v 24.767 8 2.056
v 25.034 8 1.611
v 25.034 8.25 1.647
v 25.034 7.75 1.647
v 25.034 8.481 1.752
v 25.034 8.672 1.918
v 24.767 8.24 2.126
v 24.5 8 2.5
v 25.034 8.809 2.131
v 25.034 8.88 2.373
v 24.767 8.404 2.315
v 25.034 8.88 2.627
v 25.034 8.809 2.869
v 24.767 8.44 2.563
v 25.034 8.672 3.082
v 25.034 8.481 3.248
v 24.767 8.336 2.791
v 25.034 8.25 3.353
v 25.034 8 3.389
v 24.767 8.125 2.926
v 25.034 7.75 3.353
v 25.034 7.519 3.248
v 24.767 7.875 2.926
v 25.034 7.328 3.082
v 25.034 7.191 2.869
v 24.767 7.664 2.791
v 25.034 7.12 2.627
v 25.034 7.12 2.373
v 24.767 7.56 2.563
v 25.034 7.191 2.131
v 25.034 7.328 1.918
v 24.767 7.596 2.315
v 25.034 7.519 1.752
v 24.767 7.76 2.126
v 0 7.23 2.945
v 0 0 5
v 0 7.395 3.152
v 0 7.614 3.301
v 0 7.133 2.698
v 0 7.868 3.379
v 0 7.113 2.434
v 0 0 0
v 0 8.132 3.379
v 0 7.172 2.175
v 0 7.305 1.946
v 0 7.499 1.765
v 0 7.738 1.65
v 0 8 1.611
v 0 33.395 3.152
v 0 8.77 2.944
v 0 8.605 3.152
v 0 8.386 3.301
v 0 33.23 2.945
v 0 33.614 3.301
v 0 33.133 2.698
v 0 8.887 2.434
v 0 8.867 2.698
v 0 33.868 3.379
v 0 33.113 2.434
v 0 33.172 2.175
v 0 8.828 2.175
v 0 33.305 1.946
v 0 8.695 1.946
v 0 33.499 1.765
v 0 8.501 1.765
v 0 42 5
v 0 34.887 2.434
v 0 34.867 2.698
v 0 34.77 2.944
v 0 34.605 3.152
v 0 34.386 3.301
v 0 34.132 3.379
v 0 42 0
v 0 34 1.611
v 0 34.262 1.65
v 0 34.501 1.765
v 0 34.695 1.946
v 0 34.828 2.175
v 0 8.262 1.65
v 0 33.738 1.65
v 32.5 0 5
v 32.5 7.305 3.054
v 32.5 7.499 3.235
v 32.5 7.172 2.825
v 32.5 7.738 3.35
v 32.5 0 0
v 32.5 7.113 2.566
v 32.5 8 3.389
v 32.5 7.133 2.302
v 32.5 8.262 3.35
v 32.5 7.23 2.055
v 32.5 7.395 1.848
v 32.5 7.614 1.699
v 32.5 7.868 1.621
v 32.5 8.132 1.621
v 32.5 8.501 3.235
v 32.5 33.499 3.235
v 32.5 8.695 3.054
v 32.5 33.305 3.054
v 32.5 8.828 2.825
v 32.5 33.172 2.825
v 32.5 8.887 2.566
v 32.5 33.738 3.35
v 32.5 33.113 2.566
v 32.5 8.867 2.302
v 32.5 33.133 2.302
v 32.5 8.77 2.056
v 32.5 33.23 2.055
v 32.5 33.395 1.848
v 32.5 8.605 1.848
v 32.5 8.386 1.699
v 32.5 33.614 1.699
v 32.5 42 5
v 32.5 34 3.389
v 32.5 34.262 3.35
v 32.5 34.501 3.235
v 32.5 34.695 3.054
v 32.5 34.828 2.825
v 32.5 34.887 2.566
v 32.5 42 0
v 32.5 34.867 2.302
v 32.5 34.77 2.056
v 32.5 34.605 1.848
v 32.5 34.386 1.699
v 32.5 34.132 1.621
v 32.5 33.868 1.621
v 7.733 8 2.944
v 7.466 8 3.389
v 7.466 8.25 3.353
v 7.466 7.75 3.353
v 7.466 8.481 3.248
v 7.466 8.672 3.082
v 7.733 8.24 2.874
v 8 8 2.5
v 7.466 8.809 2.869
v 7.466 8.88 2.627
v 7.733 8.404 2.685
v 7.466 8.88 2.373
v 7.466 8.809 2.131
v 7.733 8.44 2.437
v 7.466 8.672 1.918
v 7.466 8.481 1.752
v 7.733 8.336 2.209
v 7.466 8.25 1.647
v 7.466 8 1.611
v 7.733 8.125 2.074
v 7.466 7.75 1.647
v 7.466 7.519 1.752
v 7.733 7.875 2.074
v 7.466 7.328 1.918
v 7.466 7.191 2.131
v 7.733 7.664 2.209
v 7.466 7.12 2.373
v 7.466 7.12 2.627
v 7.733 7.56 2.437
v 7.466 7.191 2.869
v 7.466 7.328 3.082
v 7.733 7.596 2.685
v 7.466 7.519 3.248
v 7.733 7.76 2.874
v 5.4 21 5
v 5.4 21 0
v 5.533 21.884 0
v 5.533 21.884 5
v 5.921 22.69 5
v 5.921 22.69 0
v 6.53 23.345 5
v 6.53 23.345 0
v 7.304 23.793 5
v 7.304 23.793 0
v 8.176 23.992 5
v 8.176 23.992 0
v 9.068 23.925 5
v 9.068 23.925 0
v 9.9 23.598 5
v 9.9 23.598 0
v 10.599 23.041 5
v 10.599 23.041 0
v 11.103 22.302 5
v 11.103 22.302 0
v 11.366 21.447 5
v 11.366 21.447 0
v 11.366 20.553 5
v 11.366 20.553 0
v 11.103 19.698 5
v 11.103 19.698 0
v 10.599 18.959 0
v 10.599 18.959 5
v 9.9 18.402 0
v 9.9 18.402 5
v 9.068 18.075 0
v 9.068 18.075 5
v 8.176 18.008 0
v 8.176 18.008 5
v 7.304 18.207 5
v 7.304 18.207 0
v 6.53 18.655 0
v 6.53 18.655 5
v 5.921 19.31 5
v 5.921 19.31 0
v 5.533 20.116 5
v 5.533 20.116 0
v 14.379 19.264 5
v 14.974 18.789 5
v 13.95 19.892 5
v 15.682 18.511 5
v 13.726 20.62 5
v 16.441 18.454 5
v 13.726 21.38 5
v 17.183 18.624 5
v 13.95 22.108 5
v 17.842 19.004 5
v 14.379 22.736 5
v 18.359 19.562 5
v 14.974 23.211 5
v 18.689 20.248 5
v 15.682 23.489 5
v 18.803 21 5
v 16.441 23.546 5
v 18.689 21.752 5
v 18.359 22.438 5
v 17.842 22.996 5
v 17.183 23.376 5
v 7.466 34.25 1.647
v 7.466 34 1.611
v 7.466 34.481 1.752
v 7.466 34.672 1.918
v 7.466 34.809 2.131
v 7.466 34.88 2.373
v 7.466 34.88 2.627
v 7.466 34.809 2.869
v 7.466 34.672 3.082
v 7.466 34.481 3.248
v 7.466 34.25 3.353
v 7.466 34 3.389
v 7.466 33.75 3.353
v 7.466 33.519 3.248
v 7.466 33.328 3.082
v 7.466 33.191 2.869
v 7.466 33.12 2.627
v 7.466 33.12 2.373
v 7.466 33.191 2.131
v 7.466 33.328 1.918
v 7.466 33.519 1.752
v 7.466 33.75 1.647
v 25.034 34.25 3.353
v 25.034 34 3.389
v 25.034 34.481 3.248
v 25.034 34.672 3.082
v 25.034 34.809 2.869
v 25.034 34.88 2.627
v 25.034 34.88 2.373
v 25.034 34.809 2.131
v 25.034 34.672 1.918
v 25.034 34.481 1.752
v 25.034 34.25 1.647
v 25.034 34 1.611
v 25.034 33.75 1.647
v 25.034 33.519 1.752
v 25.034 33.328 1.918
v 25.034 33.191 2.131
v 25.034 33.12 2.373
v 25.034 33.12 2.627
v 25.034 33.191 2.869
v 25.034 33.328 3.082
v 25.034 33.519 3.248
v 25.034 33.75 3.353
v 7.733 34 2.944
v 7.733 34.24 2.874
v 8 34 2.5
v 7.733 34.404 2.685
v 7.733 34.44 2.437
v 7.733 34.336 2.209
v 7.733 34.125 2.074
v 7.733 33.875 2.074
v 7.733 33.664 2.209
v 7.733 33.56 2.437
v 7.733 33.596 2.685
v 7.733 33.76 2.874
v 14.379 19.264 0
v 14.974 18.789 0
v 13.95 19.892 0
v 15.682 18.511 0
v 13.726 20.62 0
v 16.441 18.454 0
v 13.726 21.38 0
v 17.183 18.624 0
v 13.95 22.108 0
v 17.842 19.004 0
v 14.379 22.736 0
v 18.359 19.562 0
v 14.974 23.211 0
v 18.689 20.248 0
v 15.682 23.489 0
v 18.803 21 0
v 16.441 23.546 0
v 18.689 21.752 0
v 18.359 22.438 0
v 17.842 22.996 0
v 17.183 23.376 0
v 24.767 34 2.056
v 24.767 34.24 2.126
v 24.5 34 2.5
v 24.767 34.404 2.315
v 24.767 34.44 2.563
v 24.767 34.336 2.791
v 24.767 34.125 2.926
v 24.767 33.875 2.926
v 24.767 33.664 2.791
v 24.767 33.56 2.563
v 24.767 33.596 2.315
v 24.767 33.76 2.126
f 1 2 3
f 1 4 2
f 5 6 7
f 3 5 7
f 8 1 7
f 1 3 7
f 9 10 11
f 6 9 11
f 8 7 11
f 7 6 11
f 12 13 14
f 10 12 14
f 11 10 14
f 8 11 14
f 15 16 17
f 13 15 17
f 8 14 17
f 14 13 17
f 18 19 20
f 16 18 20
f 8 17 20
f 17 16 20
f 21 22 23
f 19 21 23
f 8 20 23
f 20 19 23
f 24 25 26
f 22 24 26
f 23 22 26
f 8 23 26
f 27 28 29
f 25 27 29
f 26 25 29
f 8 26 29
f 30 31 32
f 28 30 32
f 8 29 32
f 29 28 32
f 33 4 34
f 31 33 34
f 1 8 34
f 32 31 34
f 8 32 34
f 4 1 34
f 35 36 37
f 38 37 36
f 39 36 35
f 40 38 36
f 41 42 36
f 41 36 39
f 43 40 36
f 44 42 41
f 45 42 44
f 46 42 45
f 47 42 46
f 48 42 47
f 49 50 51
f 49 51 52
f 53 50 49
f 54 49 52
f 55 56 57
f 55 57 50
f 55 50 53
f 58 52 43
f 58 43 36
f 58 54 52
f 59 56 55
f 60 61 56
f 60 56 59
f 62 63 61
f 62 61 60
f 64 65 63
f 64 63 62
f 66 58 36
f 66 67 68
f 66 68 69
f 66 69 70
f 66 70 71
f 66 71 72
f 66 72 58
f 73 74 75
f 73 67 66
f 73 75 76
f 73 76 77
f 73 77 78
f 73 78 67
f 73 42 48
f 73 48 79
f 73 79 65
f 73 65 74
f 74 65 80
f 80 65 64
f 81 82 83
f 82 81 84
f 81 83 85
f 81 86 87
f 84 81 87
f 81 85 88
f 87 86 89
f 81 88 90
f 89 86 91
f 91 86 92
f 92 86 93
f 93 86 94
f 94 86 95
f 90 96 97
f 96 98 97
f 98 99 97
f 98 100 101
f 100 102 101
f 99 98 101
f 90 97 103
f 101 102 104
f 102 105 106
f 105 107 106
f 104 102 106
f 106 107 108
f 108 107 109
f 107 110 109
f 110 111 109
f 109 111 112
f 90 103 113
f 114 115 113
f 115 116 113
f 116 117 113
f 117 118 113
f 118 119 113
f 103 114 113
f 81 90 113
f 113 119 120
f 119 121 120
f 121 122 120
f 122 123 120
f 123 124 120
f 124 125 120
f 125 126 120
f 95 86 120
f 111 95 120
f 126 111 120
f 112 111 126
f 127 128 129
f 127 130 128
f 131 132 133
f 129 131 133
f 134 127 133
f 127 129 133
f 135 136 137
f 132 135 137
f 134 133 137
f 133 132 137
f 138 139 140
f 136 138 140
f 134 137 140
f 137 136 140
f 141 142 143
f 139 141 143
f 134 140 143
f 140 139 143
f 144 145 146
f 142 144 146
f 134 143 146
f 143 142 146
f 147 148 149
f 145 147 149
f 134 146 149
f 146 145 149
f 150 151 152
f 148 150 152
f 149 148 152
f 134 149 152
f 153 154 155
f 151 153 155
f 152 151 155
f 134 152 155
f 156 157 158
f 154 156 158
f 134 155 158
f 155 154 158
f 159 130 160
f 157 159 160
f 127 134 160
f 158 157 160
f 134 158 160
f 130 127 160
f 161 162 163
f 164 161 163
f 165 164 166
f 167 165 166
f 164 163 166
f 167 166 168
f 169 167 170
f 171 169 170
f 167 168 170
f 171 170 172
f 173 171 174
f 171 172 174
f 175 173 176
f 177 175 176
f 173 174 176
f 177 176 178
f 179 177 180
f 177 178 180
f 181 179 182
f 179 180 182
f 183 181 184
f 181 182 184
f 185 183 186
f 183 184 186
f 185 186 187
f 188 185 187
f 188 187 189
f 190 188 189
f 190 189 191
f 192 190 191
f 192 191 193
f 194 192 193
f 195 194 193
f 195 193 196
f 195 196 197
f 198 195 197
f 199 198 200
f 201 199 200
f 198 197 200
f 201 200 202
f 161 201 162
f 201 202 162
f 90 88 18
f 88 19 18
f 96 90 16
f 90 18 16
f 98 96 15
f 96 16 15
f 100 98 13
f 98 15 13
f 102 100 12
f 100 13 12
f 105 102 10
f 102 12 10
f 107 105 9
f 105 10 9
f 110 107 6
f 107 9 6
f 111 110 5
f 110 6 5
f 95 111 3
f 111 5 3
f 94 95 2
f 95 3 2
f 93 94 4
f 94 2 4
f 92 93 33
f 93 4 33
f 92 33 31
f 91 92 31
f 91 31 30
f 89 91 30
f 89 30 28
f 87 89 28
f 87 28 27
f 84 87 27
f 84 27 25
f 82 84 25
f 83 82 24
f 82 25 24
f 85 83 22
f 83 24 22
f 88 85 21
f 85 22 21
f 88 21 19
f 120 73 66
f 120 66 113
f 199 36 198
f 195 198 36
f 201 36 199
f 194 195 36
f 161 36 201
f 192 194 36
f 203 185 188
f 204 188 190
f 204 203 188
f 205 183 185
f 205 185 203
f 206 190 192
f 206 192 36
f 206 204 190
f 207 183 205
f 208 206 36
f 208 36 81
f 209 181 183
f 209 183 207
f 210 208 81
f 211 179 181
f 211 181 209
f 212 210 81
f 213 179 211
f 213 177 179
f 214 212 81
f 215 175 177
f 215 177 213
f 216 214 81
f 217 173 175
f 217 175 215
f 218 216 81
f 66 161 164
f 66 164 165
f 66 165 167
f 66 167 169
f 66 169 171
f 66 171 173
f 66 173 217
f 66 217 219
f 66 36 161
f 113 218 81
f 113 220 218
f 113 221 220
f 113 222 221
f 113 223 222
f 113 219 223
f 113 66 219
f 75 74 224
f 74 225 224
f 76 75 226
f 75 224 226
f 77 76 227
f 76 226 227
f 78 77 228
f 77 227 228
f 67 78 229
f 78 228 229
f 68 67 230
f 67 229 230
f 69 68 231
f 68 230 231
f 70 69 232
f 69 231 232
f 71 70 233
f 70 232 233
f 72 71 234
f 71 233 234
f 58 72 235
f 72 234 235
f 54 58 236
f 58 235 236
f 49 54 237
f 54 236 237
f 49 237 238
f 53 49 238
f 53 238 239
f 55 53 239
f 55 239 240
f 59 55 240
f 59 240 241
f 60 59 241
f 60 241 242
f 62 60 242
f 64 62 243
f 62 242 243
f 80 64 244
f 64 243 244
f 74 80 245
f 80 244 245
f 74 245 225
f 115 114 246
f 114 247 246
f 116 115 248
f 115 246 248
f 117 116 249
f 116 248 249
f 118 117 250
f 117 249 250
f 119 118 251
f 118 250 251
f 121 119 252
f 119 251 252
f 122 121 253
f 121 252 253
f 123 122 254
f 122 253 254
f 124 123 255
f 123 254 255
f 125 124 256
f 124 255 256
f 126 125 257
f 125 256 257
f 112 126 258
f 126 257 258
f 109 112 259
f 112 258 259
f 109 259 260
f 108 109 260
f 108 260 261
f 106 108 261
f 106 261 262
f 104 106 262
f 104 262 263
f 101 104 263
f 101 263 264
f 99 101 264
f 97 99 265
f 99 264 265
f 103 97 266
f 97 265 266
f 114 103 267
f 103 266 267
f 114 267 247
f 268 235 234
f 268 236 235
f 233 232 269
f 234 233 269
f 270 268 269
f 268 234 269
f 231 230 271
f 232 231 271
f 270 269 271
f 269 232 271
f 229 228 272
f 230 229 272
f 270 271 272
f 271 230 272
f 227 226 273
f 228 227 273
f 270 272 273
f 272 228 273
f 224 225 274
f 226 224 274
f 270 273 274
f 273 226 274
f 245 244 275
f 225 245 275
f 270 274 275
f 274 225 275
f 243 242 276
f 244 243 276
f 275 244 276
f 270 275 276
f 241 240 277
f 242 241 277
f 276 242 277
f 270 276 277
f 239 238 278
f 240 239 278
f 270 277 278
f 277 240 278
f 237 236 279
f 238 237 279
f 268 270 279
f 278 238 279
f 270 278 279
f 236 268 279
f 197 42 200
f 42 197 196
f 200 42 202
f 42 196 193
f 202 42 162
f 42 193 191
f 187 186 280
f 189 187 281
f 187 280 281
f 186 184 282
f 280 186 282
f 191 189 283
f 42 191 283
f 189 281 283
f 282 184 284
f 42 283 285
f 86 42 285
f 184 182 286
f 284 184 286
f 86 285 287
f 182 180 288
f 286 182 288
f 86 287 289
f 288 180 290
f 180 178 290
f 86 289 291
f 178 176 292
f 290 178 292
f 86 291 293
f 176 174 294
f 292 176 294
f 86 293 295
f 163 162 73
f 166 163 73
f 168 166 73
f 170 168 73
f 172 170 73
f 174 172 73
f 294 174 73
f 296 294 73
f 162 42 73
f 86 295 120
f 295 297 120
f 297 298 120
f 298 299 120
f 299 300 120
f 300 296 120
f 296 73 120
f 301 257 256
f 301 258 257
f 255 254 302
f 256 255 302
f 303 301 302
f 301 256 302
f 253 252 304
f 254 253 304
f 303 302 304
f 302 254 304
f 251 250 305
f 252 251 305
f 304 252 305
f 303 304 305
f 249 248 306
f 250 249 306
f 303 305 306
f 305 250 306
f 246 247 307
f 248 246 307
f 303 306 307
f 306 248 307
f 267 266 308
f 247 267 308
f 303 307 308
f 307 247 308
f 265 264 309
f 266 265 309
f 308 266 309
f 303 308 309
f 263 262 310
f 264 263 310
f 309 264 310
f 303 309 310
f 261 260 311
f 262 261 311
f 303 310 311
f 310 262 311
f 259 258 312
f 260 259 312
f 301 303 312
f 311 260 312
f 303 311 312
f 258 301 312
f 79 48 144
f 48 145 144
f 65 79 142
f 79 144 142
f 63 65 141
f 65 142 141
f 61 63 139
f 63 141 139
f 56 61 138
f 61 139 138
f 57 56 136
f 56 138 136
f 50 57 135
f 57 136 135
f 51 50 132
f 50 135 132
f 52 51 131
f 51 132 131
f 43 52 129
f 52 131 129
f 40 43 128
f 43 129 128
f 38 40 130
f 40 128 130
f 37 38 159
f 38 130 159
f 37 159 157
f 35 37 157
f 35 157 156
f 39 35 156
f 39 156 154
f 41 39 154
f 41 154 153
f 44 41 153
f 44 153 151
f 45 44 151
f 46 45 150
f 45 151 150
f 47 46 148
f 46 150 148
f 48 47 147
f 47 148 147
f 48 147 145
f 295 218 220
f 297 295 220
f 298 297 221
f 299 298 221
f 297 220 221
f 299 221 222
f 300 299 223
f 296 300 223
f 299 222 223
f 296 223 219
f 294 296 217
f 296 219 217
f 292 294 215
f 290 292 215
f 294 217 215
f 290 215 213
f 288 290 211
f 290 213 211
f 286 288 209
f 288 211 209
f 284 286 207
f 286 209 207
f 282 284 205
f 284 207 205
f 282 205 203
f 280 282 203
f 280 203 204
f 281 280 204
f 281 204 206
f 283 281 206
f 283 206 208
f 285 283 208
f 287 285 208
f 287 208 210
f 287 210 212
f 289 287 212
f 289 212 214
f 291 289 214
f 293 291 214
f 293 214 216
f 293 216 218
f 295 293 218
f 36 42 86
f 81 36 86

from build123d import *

# Parameters (mm, degrees)
SKETCH1_W                 = 32.5
SKETCH1_H                 = 42
BOSS_EXTRUDE2_DEPTH       = 5
F_2_56_TAPPED_HOLE1_D     = 1.778
F_2_56_TAPPED_HOLE1_DEPTH = 7.46583491
F_2_56_TAPPED_HOLE1_TIP   = 0.53416509
F_2_56_TAPPED_HOLE2_D     = 1.778
F_2_56_TAPPED_HOLE2_DEPTH = 7.46583491
F_2_56_TAPPED_HOLE2_TIP   = 0.53416509
CUT_EXTRUDE1_DEPTH        = 5
F_1_4_20_TAPPED_HOLE1_D   = 5.1054


with BuildPart() as part:
    # Sketch1 → Boss-Extrude2 (new body)
    with BuildSketch(Plane.XY):
        with Locations((16.25, 21)):
            Rectangle(SKETCH1_W, SKETCH1_H)
    extrude(amount=BOSS_EXTRUDE2_DEPTH)

    # #2-56 Tapped Hole1
    with Locations(Plane.ZY):
        with Locations((2.5, 34), (2.5, 8)):
            Hole(F_2_56_TAPPED_HOLE1_D / 2, depth=F_2_56_TAPPED_HOLE1_DEPTH)
            with Locations((0, 0, -(F_2_56_TAPPED_HOLE1_DEPTH + F_2_56_TAPPED_HOLE1_TIP / 2))):  # 118° drill point
                Cone(0, F_2_56_TAPPED_HOLE1_D / 2, F_2_56_TAPPED_HOLE1_TIP, mode=Mode.SUBTRACT)

    # #2-56 Tapped Hole2
    with Locations(Plane(origin=(32.5, 0, 0), x_dir=(0, 0, -1), z_dir=(1, 0, 0))):
        with Locations((-2.5, 34), (-2.5, 8)):
            Hole(F_2_56_TAPPED_HOLE2_D / 2, depth=F_2_56_TAPPED_HOLE2_DEPTH)
            with Locations((0, 0, -(F_2_56_TAPPED_HOLE2_DEPTH + F_2_56_TAPPED_HOLE2_TIP / 2))):  # 118° drill point
                Cone(0, F_2_56_TAPPED_HOLE2_D / 2, F_2_56_TAPPED_HOLE2_TIP, mode=Mode.SUBTRACT)

    # Sketch9 → Cut-Extrude1 (cut)
    with BuildSketch(Plane(origin=(0, 0, 0), x_dir=(-1, 0, 0), z_dir=(0, 0, -1))):
        with BuildLine():
            ThreePointArc((-11.4, 21), (-8.4, 18), (-5.4, 21))
            Line((-5.4, 21), (-8.4, 21))
            Line((-8.4, 21), (-11.4, 21))
        make_face()
        with BuildLine():
            Line((-8.4, 21), (-5.4, 21))
            ThreePointArc((-5.4, 21), (-8.4, 24), (-11.4, 21))
            Line((-11.4, 21), (-8.4, 21))
        make_face()
    extrude(amount=-CUT_EXTRUDE1_DEPTH, mode=Mode.SUBTRACT)

    # 1/4-20 Tapped Hole1 (through all)
    with Locations(Plane(origin=(0, 0, 0), x_dir=(-1, 0, 0), z_dir=(0, 0, -1))):
        with Locations((-16.25, 21)):
            Hole(F_1_4_20_TAPPED_HOLE1_D / 2)


solid = part.part
